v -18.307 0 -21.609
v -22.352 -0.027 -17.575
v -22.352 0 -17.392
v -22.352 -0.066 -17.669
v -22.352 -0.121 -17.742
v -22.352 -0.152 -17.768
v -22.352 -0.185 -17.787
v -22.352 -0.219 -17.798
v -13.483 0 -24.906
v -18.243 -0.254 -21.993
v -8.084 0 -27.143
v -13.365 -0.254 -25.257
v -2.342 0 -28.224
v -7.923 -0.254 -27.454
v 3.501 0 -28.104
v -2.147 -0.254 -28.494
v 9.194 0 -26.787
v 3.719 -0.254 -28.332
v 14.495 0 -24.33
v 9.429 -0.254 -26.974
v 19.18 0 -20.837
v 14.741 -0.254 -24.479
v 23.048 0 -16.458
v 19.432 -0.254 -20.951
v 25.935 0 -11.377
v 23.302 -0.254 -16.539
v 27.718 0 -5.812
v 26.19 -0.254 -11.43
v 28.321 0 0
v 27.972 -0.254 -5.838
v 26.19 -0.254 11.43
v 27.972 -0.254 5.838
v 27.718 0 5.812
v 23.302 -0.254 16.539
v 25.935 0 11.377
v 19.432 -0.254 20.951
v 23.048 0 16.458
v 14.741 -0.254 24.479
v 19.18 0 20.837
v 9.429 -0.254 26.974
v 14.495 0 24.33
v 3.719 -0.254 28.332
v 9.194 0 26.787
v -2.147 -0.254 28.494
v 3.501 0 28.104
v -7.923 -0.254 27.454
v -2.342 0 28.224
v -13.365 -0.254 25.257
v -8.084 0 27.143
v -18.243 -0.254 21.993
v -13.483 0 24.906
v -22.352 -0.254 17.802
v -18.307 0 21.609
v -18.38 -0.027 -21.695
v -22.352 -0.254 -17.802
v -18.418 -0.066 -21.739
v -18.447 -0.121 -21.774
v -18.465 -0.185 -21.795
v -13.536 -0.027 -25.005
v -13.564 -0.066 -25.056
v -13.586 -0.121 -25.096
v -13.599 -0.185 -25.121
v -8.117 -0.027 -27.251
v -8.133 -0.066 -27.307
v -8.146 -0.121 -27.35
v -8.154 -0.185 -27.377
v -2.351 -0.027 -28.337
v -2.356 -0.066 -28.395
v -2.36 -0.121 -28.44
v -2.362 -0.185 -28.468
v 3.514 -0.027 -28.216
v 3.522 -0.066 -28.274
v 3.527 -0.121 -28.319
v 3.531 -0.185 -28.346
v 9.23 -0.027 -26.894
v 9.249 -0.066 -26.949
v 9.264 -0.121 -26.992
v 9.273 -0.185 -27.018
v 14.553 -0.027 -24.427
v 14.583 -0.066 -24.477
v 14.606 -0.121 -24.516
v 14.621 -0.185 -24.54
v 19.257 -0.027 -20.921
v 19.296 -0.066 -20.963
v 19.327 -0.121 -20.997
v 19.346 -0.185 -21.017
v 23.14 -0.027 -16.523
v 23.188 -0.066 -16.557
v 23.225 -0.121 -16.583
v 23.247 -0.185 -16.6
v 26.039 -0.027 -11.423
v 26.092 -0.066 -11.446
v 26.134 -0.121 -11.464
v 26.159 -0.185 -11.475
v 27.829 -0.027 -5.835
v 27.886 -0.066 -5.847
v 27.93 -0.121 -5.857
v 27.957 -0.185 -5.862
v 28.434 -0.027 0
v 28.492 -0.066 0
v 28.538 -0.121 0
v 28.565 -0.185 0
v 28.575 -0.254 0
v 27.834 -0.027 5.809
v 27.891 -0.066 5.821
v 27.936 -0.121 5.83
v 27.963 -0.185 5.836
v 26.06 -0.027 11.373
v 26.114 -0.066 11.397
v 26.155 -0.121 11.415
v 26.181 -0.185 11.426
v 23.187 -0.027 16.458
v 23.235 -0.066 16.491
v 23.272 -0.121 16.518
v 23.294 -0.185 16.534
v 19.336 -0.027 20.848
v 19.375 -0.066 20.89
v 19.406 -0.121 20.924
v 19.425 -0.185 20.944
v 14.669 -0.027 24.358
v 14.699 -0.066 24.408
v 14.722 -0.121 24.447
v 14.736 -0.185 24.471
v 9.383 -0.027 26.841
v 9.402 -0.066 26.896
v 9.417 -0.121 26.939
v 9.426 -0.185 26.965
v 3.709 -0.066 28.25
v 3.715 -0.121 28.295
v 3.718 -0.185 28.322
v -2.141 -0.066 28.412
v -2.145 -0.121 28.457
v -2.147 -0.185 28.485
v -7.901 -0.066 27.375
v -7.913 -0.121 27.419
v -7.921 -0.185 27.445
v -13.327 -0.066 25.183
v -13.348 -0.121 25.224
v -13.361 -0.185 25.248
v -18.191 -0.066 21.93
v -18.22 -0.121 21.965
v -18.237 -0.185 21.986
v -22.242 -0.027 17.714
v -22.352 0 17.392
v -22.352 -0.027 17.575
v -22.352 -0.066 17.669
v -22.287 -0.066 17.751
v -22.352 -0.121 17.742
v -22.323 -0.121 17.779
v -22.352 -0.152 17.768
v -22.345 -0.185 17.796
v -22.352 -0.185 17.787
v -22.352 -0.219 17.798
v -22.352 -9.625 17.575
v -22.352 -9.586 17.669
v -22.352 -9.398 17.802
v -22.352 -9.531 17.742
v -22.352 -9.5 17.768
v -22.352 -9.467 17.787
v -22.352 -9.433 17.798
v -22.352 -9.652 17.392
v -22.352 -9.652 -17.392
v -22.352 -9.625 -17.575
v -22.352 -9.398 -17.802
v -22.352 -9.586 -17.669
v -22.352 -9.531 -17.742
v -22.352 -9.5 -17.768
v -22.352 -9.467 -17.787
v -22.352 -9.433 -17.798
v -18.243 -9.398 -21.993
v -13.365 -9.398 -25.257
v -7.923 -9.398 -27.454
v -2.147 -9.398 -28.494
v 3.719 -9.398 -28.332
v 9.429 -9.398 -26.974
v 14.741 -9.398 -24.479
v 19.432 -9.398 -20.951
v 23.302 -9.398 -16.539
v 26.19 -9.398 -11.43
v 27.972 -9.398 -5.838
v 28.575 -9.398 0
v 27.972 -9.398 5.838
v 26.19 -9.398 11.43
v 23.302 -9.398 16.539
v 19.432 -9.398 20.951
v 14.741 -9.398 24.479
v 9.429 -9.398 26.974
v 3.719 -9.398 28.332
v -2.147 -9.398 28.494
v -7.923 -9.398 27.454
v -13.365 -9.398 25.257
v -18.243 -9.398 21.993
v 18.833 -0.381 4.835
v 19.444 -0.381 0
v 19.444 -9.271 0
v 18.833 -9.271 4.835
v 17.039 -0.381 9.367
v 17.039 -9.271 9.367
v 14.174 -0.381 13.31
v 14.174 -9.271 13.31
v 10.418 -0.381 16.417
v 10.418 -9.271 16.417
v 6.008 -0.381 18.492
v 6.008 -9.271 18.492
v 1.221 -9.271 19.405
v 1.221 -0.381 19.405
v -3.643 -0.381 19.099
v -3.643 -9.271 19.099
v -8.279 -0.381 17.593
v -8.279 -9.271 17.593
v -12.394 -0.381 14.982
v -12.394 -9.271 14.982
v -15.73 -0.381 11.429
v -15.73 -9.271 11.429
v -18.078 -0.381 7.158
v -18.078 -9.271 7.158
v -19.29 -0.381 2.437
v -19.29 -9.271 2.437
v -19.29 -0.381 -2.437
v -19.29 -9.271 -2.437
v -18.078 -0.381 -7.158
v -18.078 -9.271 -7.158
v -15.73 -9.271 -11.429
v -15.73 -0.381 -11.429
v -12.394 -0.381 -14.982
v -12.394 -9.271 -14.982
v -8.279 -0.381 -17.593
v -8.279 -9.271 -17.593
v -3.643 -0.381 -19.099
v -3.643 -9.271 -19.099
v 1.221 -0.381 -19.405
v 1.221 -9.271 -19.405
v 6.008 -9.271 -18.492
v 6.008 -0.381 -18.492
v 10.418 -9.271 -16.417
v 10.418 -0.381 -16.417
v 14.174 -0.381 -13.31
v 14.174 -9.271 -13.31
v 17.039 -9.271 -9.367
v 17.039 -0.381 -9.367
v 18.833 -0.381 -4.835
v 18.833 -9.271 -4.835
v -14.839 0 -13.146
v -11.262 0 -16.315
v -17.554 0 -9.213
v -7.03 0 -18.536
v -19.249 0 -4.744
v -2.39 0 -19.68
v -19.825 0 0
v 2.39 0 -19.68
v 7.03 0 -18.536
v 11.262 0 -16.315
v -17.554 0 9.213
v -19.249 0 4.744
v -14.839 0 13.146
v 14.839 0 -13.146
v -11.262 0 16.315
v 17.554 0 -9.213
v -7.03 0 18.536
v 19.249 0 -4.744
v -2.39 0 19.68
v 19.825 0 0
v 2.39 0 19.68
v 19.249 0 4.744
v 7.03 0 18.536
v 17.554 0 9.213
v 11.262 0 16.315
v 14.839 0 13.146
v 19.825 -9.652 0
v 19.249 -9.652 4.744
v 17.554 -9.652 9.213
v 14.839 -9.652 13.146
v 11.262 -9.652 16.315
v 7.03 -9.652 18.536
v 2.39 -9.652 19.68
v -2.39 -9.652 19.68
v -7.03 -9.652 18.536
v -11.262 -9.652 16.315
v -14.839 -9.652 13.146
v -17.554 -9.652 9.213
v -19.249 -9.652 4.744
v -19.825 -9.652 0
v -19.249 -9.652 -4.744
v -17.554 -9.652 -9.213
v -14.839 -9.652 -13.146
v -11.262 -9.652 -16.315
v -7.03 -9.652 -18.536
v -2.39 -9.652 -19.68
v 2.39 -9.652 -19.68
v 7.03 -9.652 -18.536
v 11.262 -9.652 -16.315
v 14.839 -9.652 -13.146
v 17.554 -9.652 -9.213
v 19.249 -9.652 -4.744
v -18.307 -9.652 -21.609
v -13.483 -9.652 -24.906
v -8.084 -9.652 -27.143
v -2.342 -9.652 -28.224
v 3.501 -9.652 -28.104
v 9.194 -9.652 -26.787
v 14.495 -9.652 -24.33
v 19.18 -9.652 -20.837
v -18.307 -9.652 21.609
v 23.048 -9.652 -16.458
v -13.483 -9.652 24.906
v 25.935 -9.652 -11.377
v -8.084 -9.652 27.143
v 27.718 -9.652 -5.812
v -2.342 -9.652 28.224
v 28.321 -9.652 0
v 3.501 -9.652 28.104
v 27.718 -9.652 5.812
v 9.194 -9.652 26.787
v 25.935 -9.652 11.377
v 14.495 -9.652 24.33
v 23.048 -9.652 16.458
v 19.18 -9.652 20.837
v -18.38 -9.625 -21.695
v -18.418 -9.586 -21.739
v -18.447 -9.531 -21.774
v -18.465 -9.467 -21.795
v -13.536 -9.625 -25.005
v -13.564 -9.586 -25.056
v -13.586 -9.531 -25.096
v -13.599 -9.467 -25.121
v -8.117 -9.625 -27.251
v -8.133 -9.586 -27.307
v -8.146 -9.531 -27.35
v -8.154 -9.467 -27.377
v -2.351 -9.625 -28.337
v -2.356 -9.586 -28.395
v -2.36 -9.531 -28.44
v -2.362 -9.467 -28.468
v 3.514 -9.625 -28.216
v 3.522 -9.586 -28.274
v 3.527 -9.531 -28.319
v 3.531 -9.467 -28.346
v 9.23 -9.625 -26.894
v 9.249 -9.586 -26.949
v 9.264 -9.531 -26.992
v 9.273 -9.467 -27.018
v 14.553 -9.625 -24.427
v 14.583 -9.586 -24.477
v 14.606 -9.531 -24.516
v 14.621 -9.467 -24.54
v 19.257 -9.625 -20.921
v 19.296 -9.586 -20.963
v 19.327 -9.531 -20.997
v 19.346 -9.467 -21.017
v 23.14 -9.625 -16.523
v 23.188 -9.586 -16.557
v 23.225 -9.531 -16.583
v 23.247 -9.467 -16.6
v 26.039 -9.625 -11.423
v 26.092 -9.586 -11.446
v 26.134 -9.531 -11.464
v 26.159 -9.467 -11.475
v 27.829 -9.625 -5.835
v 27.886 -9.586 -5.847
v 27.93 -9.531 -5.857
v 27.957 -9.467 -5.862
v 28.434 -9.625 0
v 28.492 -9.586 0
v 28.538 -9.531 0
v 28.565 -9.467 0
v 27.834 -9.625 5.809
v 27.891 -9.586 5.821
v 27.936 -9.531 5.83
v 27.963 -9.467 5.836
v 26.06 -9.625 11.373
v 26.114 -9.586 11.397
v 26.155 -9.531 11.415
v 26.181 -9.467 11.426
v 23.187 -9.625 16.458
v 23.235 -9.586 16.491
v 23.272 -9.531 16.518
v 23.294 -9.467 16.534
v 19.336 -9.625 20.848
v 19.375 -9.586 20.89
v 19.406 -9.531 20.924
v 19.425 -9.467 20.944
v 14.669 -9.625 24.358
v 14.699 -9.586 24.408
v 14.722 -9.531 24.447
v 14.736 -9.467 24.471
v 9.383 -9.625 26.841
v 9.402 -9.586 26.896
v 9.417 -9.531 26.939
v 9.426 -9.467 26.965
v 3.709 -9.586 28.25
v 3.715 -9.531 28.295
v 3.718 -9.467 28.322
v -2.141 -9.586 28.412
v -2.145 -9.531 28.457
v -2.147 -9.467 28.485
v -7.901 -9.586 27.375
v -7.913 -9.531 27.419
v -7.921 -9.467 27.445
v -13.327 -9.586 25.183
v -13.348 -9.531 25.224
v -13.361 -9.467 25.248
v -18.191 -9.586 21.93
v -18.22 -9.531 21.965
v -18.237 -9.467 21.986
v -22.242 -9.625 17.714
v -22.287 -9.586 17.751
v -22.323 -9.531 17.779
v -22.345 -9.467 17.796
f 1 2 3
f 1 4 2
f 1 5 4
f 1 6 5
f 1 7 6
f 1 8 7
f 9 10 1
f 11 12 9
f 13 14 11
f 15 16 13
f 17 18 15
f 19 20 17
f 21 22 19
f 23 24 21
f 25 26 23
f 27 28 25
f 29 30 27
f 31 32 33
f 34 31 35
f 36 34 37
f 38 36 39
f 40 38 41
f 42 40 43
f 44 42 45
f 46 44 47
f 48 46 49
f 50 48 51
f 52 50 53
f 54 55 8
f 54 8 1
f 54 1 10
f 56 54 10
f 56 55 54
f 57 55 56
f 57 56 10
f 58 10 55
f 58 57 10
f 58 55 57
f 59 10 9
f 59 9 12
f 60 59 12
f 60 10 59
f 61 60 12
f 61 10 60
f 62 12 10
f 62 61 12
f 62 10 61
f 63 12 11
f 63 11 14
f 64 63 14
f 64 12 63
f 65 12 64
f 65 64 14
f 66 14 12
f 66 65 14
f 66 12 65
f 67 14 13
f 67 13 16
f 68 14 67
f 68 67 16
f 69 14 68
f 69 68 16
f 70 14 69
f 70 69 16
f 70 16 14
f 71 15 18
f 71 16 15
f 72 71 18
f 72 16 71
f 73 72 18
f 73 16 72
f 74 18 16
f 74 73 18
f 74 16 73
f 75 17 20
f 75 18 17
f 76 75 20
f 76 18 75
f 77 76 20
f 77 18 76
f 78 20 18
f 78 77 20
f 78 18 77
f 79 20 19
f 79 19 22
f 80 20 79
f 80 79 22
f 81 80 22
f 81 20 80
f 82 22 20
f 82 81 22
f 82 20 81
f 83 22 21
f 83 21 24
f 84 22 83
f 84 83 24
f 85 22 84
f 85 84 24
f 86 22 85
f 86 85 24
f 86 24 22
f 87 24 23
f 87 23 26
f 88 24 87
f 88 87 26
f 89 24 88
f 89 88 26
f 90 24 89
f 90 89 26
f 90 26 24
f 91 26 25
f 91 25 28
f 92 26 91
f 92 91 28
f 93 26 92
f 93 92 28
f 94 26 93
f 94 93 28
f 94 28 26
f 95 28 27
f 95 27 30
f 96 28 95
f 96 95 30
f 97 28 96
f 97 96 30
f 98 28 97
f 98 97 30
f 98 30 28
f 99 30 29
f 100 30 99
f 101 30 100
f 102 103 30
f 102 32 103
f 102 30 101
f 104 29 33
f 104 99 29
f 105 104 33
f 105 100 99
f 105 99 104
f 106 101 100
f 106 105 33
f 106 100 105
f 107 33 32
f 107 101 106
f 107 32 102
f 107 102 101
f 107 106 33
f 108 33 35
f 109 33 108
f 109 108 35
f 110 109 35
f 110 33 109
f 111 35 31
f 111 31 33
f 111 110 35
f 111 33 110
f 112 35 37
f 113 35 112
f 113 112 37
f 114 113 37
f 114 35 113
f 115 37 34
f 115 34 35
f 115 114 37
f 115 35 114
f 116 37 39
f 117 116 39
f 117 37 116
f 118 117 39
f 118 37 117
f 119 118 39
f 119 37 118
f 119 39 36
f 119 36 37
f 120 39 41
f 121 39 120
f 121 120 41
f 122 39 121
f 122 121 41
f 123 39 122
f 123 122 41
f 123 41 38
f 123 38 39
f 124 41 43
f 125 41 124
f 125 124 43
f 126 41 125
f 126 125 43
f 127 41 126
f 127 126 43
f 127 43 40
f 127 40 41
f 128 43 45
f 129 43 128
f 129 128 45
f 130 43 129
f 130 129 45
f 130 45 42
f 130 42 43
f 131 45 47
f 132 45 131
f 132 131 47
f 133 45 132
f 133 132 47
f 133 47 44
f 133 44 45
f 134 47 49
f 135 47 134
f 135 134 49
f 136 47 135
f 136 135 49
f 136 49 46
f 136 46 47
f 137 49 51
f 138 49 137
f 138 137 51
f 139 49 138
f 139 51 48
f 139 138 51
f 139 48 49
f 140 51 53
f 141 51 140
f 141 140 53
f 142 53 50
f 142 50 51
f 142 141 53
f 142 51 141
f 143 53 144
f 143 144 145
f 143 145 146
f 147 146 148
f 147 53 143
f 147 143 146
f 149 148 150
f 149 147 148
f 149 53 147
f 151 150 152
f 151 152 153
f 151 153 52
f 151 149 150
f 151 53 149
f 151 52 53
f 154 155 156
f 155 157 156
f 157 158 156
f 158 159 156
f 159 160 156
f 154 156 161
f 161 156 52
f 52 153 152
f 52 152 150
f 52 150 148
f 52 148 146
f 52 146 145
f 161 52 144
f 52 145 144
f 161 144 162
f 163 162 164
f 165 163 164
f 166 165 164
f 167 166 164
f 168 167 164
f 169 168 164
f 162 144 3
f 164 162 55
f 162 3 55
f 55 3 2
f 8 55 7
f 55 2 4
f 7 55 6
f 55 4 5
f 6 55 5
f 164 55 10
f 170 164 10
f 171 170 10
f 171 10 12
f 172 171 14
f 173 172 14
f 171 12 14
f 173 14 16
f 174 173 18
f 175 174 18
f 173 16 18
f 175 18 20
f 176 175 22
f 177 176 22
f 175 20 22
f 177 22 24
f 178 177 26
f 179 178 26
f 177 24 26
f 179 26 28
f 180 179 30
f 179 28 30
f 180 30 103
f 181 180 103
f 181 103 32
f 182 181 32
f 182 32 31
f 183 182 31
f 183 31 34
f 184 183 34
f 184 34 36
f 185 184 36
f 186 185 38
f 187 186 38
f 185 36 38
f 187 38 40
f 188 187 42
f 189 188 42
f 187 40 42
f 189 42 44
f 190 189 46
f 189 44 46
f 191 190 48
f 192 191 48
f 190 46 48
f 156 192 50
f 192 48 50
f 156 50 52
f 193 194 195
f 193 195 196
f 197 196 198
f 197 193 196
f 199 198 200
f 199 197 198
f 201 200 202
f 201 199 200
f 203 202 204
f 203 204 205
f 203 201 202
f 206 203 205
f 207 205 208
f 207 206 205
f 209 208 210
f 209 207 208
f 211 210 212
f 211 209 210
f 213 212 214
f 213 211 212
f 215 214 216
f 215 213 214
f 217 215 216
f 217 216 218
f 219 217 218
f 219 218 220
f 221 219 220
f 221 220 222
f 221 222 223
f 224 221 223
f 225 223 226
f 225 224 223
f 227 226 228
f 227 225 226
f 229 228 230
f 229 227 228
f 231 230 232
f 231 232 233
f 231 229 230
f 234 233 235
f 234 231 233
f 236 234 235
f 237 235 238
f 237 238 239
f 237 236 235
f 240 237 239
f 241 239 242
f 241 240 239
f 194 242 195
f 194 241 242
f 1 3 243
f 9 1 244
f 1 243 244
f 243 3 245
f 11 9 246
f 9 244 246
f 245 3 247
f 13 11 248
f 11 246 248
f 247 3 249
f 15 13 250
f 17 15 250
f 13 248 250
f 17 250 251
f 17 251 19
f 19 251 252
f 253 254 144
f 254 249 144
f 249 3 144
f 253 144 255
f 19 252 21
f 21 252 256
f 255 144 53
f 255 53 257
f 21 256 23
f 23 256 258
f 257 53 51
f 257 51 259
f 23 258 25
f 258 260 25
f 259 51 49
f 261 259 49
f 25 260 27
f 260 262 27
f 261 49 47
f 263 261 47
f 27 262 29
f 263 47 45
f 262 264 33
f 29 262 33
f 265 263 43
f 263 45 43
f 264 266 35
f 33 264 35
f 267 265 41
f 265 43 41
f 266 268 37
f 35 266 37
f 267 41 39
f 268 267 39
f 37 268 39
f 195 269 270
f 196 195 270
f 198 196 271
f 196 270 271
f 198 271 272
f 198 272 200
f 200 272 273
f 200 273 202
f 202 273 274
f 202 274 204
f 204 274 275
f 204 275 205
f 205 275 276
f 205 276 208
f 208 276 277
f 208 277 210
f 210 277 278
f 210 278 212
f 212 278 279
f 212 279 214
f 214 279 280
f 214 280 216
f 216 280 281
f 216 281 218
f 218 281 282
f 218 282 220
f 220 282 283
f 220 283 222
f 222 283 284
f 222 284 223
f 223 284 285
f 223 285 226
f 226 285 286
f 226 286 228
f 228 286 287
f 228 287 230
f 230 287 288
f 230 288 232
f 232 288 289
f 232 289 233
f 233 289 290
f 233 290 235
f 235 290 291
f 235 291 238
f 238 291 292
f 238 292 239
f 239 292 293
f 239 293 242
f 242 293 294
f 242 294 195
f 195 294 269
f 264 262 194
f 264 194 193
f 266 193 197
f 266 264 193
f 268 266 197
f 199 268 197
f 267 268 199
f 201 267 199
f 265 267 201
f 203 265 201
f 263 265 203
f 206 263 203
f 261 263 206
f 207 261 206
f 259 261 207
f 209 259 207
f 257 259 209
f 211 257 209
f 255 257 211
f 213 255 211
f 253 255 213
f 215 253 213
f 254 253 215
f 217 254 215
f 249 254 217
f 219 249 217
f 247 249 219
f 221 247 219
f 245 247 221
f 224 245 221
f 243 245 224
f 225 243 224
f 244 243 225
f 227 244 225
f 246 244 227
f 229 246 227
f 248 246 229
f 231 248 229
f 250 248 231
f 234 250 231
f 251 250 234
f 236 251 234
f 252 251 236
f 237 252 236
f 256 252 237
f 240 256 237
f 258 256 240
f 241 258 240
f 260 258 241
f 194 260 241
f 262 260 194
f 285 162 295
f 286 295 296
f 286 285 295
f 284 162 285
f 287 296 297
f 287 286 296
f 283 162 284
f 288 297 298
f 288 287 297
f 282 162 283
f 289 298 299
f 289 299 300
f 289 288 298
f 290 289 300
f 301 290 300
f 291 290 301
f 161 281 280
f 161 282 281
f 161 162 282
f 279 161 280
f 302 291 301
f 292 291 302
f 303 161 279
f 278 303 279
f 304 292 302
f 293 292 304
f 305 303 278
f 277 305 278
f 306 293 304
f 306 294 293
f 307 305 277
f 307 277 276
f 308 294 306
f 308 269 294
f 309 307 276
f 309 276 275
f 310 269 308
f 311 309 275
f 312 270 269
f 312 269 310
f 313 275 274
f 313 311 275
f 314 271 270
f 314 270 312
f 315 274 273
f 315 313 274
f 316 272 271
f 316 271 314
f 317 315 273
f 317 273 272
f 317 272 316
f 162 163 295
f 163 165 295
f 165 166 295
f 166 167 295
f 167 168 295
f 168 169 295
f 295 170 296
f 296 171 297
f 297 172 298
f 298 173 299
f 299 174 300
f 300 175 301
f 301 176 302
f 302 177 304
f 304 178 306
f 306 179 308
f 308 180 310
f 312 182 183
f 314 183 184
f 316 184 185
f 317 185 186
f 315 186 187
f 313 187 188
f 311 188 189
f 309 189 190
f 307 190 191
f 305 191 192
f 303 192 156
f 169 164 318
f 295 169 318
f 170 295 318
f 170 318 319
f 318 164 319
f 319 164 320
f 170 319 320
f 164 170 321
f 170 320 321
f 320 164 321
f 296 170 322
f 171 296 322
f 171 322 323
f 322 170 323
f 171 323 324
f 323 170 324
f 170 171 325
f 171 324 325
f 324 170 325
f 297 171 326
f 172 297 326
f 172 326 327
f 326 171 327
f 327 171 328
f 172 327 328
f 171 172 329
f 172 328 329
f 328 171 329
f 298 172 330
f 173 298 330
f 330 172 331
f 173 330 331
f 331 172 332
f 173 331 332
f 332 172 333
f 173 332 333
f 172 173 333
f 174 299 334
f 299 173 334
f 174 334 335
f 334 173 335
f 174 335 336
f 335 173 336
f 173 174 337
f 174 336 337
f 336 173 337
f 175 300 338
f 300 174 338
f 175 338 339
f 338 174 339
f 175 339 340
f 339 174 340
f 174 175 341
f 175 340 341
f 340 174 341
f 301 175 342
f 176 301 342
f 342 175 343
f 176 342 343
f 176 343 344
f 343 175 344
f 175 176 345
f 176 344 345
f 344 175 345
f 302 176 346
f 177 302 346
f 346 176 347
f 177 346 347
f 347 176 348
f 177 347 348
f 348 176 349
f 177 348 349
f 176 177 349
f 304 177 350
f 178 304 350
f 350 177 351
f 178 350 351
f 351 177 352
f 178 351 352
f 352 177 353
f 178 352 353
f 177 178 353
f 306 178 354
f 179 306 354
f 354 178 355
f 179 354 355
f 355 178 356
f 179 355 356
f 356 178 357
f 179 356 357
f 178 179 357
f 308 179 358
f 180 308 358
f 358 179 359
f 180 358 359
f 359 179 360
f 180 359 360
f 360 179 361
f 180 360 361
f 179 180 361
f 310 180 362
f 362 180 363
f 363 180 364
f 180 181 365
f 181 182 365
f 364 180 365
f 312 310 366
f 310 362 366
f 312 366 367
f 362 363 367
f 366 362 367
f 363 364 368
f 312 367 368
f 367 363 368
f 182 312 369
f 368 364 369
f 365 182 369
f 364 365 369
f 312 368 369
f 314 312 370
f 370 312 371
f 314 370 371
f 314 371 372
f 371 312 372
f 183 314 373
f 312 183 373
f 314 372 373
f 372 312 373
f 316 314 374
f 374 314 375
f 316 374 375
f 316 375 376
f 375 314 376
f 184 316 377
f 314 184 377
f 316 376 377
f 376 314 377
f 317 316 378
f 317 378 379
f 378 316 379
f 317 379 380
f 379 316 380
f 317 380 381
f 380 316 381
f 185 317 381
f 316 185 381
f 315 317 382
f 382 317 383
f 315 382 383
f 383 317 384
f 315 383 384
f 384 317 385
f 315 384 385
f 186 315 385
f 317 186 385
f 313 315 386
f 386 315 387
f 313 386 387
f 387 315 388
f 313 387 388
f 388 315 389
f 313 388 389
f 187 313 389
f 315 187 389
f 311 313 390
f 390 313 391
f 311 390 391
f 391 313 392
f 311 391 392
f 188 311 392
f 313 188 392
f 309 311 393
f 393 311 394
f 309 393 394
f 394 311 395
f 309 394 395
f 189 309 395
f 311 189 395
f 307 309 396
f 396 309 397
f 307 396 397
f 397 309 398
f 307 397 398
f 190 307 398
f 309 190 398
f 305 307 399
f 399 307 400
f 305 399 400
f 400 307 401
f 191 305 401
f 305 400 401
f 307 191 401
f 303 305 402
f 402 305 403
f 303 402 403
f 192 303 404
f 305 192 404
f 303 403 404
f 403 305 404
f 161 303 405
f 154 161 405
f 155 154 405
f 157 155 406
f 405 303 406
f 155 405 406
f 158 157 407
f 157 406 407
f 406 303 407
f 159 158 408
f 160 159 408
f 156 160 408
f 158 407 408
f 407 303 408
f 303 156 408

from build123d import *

# Parameters (mm, degrees)
F0_R     = 19.4437
F1_DEPTH = 9.652
F2_SIZE  = 0.381
F3_R     = 0.254


with BuildPart() as f1:
    # F0 (on Front) → F1 (new body)
    with BuildSketch(Plane.XZ):
        with BuildLine():
            Line((-22.352, 17.802211), (-22.352, -17.802211))
            ThreePointArc((-22.352, -17.802211), (28.575, 0), (-22.352, 17.802211))
        make_face()
        Circle(F0_R, mode=Mode.SUBTRACT)
    extrude(amount=F1_DEPTH)

    # F2
    f2_edges = [f1.edges().sort_by_distance(p)[0] for p in [
        (-19.4437, -9.652, 0),
        (-19.4437, 0, 0),
    ]]
    chamfer(f2_edges, length=F2_SIZE)

    # F3
    f3_edges = [f1.edges().sort_by_distance(p)[0] for p in [
        (28.575, -9.652, 0),
        (28.575, 0, 0),
    ]]
    fillet(f3_edges, radius=F3_R)


solid = f1.part
